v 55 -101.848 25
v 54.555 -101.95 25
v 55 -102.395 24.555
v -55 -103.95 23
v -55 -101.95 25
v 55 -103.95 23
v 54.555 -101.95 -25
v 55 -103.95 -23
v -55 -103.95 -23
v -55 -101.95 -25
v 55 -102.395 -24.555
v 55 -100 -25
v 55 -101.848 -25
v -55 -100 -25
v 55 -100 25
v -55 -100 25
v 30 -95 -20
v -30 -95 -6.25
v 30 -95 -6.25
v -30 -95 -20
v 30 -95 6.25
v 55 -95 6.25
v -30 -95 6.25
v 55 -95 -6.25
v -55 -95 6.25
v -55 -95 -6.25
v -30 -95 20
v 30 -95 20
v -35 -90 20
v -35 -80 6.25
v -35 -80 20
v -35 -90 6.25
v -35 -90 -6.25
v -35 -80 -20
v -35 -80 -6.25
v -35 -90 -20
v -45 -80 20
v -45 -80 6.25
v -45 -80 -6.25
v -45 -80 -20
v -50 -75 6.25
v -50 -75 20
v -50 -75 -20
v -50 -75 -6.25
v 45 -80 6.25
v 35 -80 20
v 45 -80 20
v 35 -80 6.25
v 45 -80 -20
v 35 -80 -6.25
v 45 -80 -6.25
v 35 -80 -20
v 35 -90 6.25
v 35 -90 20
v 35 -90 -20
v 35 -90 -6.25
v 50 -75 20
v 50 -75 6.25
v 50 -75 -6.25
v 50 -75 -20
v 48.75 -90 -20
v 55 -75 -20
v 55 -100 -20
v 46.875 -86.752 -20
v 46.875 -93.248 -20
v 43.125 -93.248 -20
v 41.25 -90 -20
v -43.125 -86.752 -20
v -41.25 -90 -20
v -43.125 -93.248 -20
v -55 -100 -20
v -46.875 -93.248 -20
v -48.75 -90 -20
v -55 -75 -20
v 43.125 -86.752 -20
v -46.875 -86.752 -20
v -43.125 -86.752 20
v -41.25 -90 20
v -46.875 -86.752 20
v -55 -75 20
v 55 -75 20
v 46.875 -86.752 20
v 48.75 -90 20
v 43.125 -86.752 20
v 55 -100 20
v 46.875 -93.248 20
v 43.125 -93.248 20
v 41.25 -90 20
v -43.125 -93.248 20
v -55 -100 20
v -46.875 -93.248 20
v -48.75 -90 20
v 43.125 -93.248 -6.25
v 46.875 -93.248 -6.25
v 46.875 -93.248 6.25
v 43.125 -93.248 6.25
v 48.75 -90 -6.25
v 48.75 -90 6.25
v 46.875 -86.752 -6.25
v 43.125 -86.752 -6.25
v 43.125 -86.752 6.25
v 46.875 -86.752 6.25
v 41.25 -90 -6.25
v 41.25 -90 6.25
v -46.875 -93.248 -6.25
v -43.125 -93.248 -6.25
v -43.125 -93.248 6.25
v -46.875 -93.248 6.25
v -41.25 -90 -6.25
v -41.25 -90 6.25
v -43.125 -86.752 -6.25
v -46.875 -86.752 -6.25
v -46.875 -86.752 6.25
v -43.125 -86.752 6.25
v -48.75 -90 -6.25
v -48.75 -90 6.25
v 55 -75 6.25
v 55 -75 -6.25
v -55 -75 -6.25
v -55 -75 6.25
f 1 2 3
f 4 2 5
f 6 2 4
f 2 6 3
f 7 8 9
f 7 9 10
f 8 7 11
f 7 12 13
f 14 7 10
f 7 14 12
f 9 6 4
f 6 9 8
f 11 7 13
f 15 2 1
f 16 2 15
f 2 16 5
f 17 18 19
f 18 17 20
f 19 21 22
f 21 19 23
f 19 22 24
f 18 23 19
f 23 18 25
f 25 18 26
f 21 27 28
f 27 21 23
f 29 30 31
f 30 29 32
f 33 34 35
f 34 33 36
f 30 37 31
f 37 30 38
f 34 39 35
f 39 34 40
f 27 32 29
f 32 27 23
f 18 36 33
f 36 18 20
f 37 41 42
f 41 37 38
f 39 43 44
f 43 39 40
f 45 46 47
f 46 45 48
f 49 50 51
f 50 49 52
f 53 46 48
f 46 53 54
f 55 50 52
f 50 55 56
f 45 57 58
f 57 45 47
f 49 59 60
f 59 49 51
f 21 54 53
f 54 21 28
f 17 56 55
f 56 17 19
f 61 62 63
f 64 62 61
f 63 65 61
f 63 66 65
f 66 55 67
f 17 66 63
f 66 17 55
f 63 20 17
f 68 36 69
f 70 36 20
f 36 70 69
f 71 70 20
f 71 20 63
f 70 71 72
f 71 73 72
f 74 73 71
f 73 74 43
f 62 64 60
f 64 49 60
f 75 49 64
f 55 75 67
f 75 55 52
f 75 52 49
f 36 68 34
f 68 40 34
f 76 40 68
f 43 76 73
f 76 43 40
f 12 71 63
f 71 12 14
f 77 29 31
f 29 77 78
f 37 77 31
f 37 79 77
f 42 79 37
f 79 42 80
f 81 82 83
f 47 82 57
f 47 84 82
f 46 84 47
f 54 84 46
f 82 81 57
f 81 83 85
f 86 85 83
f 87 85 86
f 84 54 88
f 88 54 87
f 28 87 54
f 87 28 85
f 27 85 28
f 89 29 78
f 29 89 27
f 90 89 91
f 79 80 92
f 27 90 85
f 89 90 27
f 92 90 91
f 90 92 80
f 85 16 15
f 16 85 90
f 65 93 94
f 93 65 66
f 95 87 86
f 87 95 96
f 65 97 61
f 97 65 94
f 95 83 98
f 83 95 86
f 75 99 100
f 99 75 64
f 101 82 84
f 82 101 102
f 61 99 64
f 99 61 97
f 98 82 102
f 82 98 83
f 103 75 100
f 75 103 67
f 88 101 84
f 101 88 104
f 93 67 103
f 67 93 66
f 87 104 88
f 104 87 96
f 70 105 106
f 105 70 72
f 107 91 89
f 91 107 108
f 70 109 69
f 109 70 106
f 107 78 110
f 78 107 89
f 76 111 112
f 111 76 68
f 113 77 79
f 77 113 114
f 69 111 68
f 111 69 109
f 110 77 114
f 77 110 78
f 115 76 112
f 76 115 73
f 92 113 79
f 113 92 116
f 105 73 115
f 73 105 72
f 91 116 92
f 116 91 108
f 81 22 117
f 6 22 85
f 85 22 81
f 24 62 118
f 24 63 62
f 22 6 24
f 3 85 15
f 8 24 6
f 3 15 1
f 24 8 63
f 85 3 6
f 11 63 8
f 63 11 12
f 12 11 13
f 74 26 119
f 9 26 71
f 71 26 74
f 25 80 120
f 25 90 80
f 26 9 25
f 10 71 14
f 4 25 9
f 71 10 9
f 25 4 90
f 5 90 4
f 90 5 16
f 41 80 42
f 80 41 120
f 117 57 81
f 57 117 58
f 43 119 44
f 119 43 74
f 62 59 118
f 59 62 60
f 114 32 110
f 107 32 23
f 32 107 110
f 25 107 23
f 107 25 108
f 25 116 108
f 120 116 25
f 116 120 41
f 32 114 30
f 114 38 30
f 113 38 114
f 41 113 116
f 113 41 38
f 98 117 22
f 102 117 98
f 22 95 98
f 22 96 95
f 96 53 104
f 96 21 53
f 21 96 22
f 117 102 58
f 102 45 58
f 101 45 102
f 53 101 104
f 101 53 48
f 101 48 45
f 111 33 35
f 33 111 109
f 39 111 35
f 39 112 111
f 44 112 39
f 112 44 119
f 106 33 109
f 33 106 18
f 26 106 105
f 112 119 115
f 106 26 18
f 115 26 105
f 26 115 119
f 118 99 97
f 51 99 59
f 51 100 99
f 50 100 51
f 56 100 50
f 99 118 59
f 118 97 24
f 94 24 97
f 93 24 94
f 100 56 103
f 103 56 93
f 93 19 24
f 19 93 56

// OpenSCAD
// file: frame-middle.scad
/*
 * SPDX-FileCopyrightText: © 2023 Brian S. Stephan <bss@incorporeal.org>
 * SPDX-License-Identifier: GPL-3.0-or-later
 */

include <parameters.scad>
include <components.scad>

module base_middle_frame() {
	difference() {
		mid_frame();
		// chop the left and right edge off
		mid_side_chopper();
		mirror([1, 0, 0]) mid_side_chopper();
	}
}

module middle_frame() {
	difference() {
		base_middle_frame();
		// connection holes to other frames
		frame_connection_holes();
		mirror([1, 0, 0]) frame_connection_holes();

		// cable routing holes
		translate([-30,0,0]) frame_cable_routing_hole();
		translate([30,0,0]) mirror([1, 0, 0]) frame_cable_routing_hole();

		// neutrik mounts for connector, switches
		translate([0, (frame_y/2)-neutrik_panel_thickness, 0]) rotate([90, 0, 0]) neutrik_d_mount();
		translate([0, (frame_y/2)-neutrik_panel_thickness-4, 0]) frame_cutout();
		//translate([-40, (frame_y/2)-neutrik_panel_thickness, 0]) rotate([90, 0, 0]) neutrik_d_mount();
		//translate([-40, (frame_y/2)-neutrik_panel_thickness-4, 0]) frame_cutout();
		//translate([40, (frame_y/2)-neutrik_panel_thickness, 0]) rotate([90, 0, 0]) neutrik_d_mount();
		//translate([40, (frame_y/2)-neutrik_panel_thickness-4, 0]) frame_cutout();
	}
}

middle_frame();
// file: parameters.scad
/*
 * SPDX-FileCopyrightText: © 2023 Brian S. Stephan <bss@incorporeal.org>
 * SPDX-License-Identifier: GPL-3.0-or-later
 */

// adjustments
hole_tolerance = 0.15;

// M2
m2_screw_selftap_radius = 0.95;

// M3
m3_screw_selftap_radius = 1.3;

// M4
m4_bolt_radius = 2 + hole_tolerance;
m4_bolt_countersink_radius = 6.1 + hole_tolerance;
m4_bolt_hex_exterior_radius = 3.6 + hole_tolerance;

// 24mm button
small_button_radius = 12 + hole_tolerance;

// 30mm button
big_button_radius = 15 + hole_tolerance;

// JLF mount dimensions
lever_mount_x = 53;
lever_mount_y = 95;
lever_mount_z = 2;

// standard lever hole
lever_plate_hole = 12;


// case dimensions
// base frame box. reminder: top of inside (including mounts) is chopped by panel_z for plates
frame_x = 208;
frame_y = 208;
frame_z = 50;

// middle piece dimensions
mid_frame_x = 118;

/*
frame_x = 233;
frame_y = 208;
frame_z = 57;
*/



// degree to which the extended frame pieces stick out from the end of the frame
frame_extension_x = 25;
frame_extension_y = 25;

// this sinks the bottom and top of the frame inward a bit, and is used to math out two shapes
// when creating the frame box / overhang panel
frame_bevel_height = 2;
overhang_panel_bevel_height = 1;

frame_center_to_neutrik = 70;

// depth of the "lip" of the frame that the top plate sets into/supports the overhang
frame_wall = 4;

// width of the column in the frame corners to support the hex bolt
frame_mount_column_width = 20;

// per neutrik (mm)
neutrik_panel_thickness = 3;

// top plate, which can either be the whole plate ("inset") or the mounting frame for a plate that overhangs
panel_x = frame_x - (frame_wall * 2);
panel_y = frame_y - (frame_wall * 2);
panel_z = 5;
mid_panel_x = mid_frame_x - (frame_wall * 2);


// how much the top plate x/y is expanded to overhang the frame
// note that this is relative to the top plate (so the wall is added back)
panel_overhang_amount = 8.5;
overhang_panel_x = panel_x + (frame_wall * 2) + (panel_overhang_amount * 2);
overhang_panel_y = panel_y + (frame_wall * 2) + (panel_overhang_amount * 2);
// mid overhang
mid_overhang_panel_x = mid_panel_x + (frame_wall * 2) + (panel_overhang_amount * 2);


panel_to_frame_point_x = (panel_x/2)-10;
panel_to_frame_point_y = (panel_y/2)-10;
mid_panel_to_frame_point_x = (mid_panel_x/2)-10;


// frame interior that supports the top plates
panel_support_width = 5;

// neutrik D screw holes
neutrik_d_screw_radius = 1.6 + hole_tolerance;
neutrik_d_radius = 12 + hole_tolerance;

// additional button radius for decorative panels, etc.
decorative_radius_scale = 1.75;
jumbo_decorative_radius_scale = 2;
// main file
/*
 * SPDX-FileCopyrightText: © 2024 Brian S. Stephan <bss@incorporeal.org>
 * SPDX-License-Identifier: GPL-3.0-or-later
 */

include <parameters.scad>
include <components.scad>
use <frame-middle.scad>

module bottom_middle_frame_piece() {
	piece_width = panel_support_width+frame_wall+frame_mount_column_width;
	intersection() {
		middle_frame();
		difference() {
			// include the whole bottom wall (including mount columns)
			translate([0, -(frame_y/2)+(piece_width/2), 0]) cube([frame_x, piece_width, frame_z], center=true);
			// ...minus the frame wall and lip on the left
			translate([-frame_x/2+frame_wall/2, 0, 0])
				cube([frame_wall, frame_y, frame_z], center=true);
			// ...minus a slot for the combining piece to go into
			cube([frame_x, frame_y-(panel_support_width+frame_wall)*2, frame_z/4], center=true);
		}
	}
}

bottom_middle_frame_piece();
